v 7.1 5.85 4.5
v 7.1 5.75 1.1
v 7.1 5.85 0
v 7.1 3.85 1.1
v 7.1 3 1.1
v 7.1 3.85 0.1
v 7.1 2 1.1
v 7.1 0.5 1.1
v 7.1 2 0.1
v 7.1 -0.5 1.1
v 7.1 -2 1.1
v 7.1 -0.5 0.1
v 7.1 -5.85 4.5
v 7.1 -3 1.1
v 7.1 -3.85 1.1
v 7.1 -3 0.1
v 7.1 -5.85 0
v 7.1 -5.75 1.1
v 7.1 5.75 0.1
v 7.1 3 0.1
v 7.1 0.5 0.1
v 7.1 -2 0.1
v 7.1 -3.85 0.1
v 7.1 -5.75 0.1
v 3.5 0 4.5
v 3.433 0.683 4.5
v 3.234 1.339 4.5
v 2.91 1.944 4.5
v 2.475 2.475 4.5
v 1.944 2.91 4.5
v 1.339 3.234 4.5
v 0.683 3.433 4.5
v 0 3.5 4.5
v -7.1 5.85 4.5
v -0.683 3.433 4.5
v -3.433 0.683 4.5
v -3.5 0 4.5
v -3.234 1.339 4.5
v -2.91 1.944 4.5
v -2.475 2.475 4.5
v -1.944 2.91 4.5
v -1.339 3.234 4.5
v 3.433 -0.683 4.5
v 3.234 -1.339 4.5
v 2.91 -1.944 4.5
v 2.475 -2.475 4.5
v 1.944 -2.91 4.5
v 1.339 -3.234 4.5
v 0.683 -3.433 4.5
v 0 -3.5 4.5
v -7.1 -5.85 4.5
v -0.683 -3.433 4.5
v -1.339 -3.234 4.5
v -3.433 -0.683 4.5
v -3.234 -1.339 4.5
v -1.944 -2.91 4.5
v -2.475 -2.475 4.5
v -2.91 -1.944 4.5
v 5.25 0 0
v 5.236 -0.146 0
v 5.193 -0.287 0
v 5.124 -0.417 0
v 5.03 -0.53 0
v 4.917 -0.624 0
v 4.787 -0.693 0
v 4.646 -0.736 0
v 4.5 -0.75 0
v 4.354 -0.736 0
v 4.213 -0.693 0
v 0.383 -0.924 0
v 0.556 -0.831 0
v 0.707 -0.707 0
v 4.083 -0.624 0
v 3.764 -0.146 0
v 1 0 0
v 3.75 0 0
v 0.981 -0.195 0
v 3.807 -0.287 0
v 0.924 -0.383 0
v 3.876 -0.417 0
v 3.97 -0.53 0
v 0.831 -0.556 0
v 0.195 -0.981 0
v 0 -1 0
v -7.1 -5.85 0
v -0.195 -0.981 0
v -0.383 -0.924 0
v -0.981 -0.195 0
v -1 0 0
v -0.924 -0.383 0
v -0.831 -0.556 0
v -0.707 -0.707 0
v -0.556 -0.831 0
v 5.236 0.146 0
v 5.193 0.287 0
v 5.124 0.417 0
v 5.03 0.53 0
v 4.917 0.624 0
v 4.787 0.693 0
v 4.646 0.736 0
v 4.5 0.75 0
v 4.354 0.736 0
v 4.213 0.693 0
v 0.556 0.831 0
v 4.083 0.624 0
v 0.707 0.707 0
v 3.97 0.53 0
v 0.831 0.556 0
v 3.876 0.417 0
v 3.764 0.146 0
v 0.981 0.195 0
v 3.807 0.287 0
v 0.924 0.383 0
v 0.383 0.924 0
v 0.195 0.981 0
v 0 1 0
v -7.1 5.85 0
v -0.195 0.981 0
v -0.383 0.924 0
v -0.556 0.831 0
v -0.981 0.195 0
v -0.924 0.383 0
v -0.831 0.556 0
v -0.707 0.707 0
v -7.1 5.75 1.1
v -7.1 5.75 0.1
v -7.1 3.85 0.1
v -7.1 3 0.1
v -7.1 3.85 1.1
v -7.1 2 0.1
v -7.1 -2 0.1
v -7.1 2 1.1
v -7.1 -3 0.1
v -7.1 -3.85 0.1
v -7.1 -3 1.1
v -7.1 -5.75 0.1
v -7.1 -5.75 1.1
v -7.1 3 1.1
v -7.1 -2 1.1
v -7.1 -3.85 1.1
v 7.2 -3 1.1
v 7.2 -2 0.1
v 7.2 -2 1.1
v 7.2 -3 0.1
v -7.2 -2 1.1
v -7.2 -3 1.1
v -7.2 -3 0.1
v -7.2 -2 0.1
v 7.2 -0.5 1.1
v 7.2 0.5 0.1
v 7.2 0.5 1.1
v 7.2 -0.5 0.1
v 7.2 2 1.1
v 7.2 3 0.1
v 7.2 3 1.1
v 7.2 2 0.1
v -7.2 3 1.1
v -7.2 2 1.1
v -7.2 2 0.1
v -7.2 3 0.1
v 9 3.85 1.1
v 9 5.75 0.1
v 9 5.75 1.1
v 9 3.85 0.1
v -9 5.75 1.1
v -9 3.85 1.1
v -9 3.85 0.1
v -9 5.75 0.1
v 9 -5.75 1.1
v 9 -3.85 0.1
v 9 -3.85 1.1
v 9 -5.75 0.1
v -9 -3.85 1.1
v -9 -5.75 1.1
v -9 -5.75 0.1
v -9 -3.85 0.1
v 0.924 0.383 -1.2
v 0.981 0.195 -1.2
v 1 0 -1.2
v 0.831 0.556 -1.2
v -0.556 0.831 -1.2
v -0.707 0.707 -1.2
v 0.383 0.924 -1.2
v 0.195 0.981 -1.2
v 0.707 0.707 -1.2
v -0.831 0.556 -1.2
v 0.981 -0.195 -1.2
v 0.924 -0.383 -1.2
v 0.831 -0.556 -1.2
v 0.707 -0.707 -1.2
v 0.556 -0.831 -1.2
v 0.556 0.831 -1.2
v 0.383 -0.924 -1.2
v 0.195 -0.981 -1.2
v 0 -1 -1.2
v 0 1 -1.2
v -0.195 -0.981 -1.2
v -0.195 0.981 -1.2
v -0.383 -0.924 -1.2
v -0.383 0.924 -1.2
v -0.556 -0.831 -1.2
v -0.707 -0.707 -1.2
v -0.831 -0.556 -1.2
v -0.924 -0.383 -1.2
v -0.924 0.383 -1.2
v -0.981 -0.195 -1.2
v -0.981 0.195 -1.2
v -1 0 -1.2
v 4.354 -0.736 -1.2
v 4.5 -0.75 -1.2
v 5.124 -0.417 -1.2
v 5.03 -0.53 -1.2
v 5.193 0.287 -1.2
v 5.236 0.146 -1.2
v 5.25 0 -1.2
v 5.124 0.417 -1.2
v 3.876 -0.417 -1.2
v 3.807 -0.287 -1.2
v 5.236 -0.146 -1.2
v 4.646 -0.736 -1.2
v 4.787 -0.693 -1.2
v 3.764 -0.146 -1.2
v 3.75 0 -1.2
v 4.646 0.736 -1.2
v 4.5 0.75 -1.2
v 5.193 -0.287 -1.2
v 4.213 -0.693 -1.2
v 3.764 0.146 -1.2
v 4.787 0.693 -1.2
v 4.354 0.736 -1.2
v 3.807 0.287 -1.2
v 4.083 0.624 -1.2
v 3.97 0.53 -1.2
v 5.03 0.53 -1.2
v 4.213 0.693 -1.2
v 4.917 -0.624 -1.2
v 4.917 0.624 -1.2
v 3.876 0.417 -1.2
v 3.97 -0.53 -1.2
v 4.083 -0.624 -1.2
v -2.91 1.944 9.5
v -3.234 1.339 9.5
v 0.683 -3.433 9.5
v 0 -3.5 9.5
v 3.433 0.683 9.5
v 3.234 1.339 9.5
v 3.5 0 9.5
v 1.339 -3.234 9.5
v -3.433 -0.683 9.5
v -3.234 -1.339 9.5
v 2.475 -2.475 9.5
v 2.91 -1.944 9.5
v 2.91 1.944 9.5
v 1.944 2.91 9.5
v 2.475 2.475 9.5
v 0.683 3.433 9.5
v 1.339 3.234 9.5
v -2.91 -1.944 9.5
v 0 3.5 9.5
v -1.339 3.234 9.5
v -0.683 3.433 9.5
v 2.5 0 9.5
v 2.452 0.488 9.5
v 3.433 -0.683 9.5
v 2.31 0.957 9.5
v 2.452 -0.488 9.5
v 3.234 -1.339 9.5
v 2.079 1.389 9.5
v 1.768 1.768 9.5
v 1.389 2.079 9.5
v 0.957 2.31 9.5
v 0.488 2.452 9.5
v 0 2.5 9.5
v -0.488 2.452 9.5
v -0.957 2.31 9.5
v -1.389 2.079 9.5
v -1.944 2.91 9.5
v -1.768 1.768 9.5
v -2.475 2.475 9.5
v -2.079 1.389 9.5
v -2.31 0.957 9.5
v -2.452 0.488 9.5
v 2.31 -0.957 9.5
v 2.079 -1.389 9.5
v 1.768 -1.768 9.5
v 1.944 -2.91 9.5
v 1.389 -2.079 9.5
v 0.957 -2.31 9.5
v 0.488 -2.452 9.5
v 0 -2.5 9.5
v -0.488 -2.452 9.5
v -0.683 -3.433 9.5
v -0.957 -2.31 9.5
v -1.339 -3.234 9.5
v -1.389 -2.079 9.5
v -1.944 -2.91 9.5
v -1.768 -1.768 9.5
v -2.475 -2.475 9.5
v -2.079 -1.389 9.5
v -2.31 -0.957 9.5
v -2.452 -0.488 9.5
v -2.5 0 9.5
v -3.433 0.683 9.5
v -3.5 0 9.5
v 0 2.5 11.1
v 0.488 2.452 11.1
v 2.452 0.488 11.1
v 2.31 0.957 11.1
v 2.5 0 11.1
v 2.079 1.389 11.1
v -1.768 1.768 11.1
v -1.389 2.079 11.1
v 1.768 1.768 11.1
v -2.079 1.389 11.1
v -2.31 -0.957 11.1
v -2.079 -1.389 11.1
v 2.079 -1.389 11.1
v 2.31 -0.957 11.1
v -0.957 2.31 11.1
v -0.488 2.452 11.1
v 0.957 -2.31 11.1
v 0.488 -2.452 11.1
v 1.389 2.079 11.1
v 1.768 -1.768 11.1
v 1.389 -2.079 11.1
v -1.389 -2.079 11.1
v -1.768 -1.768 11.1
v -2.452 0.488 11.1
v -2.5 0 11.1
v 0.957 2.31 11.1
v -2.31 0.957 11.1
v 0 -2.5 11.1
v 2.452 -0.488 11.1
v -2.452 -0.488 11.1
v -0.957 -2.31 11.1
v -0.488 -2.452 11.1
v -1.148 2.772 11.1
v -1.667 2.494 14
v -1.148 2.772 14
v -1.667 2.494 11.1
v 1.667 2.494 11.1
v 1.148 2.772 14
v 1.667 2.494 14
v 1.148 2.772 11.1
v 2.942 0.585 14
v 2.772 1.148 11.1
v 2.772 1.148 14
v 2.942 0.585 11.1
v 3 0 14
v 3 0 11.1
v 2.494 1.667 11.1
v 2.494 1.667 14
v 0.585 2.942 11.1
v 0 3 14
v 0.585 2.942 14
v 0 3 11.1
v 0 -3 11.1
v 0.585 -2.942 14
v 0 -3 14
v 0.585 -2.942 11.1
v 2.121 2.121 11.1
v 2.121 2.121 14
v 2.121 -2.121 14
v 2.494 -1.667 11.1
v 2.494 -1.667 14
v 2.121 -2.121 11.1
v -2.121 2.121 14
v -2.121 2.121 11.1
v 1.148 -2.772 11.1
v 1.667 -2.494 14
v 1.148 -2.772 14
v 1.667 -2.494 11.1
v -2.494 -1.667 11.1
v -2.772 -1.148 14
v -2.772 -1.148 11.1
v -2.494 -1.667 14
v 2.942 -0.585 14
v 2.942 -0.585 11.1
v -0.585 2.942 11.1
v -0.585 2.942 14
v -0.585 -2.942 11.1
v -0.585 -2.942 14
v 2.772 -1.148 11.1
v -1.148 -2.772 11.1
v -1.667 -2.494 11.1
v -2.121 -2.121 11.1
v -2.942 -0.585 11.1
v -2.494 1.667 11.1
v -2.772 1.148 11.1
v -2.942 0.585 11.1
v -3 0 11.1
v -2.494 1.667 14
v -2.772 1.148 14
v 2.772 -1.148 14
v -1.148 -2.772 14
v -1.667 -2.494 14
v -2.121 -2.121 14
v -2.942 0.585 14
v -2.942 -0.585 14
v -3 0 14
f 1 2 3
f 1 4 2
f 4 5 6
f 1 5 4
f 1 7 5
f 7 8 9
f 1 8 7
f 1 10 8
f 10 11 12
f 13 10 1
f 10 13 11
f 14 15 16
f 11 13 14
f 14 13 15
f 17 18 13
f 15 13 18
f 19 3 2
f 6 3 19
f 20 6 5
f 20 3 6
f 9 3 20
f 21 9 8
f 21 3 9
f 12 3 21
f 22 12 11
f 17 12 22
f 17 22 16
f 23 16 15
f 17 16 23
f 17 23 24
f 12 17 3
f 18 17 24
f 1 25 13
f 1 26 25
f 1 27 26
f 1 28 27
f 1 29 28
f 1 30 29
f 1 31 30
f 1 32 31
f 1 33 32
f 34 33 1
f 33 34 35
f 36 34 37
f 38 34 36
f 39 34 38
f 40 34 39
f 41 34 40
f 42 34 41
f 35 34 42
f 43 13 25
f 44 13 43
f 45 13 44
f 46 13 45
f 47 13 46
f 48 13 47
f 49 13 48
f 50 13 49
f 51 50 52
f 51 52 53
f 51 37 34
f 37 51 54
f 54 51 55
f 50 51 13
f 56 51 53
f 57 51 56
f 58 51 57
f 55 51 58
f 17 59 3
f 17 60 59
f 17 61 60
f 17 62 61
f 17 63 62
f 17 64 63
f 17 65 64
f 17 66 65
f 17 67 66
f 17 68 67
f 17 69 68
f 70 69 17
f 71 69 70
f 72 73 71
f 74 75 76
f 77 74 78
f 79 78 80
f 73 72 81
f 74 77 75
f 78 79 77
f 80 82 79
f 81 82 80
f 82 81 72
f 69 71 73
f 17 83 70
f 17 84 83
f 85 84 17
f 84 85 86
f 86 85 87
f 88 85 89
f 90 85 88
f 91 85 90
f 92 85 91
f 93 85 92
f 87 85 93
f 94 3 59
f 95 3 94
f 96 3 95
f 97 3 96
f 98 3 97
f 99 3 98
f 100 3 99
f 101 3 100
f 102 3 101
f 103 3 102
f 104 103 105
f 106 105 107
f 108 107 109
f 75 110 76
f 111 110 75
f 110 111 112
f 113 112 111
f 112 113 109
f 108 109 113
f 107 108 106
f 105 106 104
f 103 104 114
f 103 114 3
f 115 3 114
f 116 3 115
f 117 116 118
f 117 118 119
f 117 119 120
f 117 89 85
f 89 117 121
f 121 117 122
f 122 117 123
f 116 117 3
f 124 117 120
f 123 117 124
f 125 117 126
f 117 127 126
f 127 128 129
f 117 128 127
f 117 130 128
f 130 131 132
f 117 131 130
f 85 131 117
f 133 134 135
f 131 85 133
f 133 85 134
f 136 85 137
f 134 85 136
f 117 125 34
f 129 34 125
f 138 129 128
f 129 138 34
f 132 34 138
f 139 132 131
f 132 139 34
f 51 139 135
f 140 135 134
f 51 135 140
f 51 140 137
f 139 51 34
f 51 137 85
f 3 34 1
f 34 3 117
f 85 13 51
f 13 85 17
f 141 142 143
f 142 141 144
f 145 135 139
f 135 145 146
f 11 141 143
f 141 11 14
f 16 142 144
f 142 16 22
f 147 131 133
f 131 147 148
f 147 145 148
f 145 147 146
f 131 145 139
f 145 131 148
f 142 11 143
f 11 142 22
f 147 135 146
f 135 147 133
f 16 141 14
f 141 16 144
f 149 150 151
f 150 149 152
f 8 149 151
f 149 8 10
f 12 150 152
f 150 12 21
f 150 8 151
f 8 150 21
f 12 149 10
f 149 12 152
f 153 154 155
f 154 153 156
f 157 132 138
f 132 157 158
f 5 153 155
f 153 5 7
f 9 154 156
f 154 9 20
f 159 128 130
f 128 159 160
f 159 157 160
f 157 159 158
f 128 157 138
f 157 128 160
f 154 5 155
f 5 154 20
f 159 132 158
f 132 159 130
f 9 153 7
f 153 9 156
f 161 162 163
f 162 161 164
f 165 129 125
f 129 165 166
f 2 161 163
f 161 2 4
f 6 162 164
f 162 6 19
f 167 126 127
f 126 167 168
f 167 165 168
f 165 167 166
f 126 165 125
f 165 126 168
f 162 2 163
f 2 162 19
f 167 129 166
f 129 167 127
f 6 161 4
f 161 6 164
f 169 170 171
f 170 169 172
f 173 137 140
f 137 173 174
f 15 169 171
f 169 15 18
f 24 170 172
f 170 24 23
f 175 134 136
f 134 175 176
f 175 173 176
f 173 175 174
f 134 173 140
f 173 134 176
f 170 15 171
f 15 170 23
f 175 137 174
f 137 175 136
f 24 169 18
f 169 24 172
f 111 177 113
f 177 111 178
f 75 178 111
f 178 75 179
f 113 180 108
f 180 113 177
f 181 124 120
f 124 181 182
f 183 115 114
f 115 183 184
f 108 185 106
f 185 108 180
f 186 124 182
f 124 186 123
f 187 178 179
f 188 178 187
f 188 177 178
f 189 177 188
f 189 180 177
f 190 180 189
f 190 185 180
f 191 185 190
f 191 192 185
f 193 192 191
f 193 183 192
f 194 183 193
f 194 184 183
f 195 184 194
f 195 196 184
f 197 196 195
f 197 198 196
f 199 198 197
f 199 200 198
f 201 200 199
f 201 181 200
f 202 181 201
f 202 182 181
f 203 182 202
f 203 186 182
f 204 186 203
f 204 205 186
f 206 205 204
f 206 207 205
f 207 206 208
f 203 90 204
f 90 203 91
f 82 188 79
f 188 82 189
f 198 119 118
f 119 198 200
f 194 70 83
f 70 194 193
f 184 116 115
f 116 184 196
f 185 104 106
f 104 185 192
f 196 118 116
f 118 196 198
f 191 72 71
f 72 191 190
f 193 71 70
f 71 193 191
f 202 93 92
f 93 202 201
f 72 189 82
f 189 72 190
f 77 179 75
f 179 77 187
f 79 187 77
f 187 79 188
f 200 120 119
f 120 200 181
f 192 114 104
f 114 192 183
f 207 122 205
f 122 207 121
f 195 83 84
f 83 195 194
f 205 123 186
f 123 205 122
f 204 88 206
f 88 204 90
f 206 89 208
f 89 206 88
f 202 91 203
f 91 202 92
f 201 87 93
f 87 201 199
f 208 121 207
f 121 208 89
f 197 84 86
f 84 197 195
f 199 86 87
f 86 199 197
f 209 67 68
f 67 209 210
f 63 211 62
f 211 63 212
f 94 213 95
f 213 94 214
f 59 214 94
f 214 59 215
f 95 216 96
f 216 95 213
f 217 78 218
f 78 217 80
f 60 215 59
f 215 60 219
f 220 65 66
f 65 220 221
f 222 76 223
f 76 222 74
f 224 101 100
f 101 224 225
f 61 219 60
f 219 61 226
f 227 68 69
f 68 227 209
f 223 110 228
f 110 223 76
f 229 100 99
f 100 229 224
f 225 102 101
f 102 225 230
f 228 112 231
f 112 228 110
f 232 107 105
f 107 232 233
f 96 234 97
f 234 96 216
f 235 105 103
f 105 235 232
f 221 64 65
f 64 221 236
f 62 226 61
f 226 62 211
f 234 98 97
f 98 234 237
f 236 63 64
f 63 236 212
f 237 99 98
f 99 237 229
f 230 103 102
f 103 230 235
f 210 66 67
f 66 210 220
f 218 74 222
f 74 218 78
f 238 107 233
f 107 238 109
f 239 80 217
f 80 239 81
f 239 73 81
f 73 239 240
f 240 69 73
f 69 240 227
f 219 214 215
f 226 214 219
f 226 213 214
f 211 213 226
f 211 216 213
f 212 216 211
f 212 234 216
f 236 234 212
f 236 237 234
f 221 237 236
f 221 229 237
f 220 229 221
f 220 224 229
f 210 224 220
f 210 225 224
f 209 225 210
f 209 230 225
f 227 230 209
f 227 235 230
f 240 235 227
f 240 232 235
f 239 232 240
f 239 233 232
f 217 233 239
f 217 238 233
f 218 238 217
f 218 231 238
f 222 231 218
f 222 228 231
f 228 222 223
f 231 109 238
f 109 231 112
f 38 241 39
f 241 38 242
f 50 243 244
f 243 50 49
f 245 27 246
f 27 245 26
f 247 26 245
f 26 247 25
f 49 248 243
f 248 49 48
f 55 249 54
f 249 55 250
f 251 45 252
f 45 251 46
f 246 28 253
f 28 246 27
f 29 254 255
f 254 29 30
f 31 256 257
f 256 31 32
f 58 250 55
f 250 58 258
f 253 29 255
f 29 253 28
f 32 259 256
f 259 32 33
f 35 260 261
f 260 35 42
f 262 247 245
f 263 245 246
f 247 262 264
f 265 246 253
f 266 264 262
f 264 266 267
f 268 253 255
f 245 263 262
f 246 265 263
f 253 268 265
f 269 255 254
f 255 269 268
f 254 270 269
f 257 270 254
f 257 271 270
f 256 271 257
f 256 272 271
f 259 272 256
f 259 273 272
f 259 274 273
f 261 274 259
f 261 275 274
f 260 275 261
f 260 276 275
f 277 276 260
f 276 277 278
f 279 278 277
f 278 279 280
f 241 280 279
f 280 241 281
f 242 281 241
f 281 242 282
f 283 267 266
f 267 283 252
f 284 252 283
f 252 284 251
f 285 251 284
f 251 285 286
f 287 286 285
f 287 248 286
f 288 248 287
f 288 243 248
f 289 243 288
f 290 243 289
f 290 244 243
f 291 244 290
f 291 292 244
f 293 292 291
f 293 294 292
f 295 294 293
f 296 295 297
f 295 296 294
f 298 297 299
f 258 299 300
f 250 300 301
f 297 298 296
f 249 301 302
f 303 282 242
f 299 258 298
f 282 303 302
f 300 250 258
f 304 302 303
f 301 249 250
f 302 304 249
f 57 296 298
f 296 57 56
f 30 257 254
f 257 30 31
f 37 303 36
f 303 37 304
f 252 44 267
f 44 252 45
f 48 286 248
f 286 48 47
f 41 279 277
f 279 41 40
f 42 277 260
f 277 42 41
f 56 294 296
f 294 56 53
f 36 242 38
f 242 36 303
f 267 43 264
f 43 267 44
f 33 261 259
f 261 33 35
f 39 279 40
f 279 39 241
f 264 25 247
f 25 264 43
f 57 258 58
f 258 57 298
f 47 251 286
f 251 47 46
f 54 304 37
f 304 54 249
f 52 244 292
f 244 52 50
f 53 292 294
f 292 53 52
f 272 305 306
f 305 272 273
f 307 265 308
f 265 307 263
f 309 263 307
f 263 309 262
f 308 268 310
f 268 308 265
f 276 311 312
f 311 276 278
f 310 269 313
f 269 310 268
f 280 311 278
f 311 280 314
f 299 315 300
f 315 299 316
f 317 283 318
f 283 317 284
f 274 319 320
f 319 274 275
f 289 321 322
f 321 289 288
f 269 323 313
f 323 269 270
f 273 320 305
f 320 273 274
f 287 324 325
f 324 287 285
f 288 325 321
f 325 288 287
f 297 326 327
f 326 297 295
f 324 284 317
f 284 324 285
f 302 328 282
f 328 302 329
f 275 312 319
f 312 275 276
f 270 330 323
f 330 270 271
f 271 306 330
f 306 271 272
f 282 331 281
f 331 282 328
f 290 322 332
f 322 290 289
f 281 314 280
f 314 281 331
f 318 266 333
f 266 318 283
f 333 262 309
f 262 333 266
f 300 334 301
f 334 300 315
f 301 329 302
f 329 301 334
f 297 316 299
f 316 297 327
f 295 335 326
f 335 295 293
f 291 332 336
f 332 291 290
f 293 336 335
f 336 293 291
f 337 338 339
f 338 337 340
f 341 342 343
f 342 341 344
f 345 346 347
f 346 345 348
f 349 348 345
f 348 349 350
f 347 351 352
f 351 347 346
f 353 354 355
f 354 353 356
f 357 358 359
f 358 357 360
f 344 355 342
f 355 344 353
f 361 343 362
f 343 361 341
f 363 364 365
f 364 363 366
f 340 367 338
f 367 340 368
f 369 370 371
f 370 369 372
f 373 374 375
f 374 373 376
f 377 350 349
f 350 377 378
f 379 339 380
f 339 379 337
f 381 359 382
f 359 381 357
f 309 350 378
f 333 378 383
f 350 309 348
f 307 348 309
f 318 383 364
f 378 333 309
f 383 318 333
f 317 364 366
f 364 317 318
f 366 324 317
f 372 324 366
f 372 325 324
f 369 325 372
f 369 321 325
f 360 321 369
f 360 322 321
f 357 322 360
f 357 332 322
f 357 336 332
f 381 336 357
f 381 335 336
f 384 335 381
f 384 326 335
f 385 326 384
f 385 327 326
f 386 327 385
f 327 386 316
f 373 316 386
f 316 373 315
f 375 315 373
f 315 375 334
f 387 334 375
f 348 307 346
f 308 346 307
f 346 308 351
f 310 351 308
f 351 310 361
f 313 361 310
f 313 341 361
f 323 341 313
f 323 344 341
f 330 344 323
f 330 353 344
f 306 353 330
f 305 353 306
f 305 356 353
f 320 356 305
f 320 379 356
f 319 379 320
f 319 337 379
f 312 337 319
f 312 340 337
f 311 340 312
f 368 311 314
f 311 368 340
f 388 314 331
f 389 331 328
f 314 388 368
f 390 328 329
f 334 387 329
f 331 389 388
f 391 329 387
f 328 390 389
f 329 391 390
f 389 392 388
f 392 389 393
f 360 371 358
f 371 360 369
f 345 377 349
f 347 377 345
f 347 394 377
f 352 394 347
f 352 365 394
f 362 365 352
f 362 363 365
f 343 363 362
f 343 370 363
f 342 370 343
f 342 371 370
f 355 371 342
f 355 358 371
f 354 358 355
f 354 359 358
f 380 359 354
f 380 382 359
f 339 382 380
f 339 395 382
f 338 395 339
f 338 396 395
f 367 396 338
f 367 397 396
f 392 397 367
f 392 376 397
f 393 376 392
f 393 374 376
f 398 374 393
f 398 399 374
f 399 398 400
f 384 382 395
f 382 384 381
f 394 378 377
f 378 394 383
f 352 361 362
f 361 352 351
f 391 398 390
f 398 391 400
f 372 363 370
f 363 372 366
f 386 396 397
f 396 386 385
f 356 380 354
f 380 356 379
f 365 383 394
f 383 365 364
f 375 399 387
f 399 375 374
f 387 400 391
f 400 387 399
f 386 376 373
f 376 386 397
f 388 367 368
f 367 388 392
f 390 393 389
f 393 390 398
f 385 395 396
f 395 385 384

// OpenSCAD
/**
 * Martin Egli
 * 2023-09-13
 */

module origin(col = "red", loc_res = 5, height = 20) {
    color(col)
    cylinder(d1 = 0, d2 = 1, h = 20, $fn = loc_res);
}

//TC20-11RWA
module ledsTC2011RWA(loc_res = 32, show_origin = 1) {
    // origin: center
    if(show_origin) {
        translate([0, 0, 0])
        origin();
    }
    
    translate([-6/2*2.54, -38.1/2, 0]) {
        // pins
        color("LightGray") {
            // pins 1 - 7
            translate([0, 0, -4])
            for(n = [0:1:6]) {
                translate([n*2.54, 0, 0])
                rotate([0, 0, 45])
                cylinder(d = 0.5, h = 4, $fn = 4);
            }
            // pins 8 - 14
            translate([0, 38.1, -4])
            for(n = [0:1:6]) {
                translate([n*2.54, 0, 0])
                rotate([0, 0, 45])
                cylinder(d = 0.5, h = 4, $fn = 4);
            }
        }
        deltax = (37.7-(6*2.54))/2;
        deltay = (53-38.1)/2;
        // case
        color("White")
        translate([-deltax, -deltay, 0])
        cube([37.7-0.1, 53, 8.45]);
        
        deltax2 = (37.7 - 4*7.62)/2;
        deltay2 = (53 - 6*7.62)/2;
        leddia = 5.0;
        color("Red")
        translate([-(deltax-deltax2), -deltay2, 8.45]) {
            for(m = [0:1:6]) {
                for(n = [0:1:4]) {
                    translate([n*7.62, m*7.62, 0])
                    cylinder(d = leddia, h = 0.1, $fn = loc_res);
                }
            }
        }
    }
}

//TC20-11RWA
module ledsTC2011RWA_cut(loc_res = 32, cut_height = 10, show_origin = 1) {
    // origin: center
    if(show_origin) {
        translate([0, 0, 0])
        origin();
    }
    
    translate([-6/2*2.54, -38.1/2, 0]) {
        deltax = (37.7-(6*2.54))/2+0.2;
        deltay = (53-38.1)/2+0.2;
        // case
        translate([-deltax, -deltay, 0])
        cube([37.7-0.1+0.2*2, 53+0.2*2, cut_height]);
    }
}

//TC20-11RWA
module ledsTC2011RWA_chtholes(loc_res = 32) {
    translate([-6/2*2.54, -38.1/2, 0]) {
        // pins
        color("LightGray") {
            // pins 1 - 7
            translate([0, 0, -4])
            for(n = [0:1:6]) {
                translate([n*2.54, 0, 0])
                rotate([0, 0, 45])
                cylinder(d = 1, h = 5, $fn = loc_res);
            }
            // pins 8 - 14
            translate([0, 38.1, -4])
            for(n = [0:1:6]) {
                translate([n*2.54, 0, 0])
                rotate([0, 0, 45])
                cylinder(d = 1, h = 5, $fn = loc_res);
            }
        }
    }
}
//ledsTC2011RWA();
//ledsTC2011RWA_cut();
//ledsTC2011RWA_chtholes();

//TS02-66-95-BK-260-LCR-D
module buttonTS0266(height = 6, loc_res = 32, show_origin = 1) {
    // origin: center
    if(show_origin) {
        translate([0, 0, 0])
        origin();
    }
    // button
    color("Black")
    translate([0, 0, 0])
    cylinder(d = 4, h = height, $fn = loc_res);
    
    // body
    color("Black")
    translate([-3, -3, 0])
    cube([6, 6, 3.5-0.1]);
    color("LightGray")
    translate([-3, -3, 3.5-0.1])
    cube([6, 6, 0.1]);
    
    // THT
    color("LightGray") {
        translate([-6.5/2, -4.5/2, -3])
        cylinder(d = 1.0, h = 4, $fn = loc_res);
        translate([-6.5/2, +4.5/2, -3])
        cylinder(d = 1.0, h = 4, $fn = loc_res);
        translate([+6.5/2, -4.5/2, -3])
        cylinder(d = 1.0, h = 4, $fn = loc_res);
        translate([+6.5/2, +4.5/2, -3])
        cylinder(d = 1.0, h = 4, $fn = loc_res);
    }
}

module buttonTS026695(loc_res = 32, show_origin = 1) {
    buttonTS0266(9.5, loc_res, show_origin);
}

module buttonTS0266_cut(height = 12, loc_res = 32, show_origin = 1) {
    // origin: center
    if(show_origin) {
        translate([0, 0, 0])
        origin();
    }
    // button
    translate([0, 0, 0])
    cylinder(d = 5, h = height, $fn = loc_res);
    // body
    translate([-3.5, -3.5, 0])
    cube([7, 7, 3.7]);
}

module buttonTS0266_cutholes(loc_res = 32) {
    // origin: center
    translate([-6.5/2, -4.5/2, -3])
    cylinder(d = 1.5, h = 5, $fn = loc_res);
    translate([-6.5/2, +4.5/2, -3])
    cylinder(d = 1.5, h = 5, $fn = loc_res);
    translate([+6.5/2, -4.5/2, -3])
    cylinder(d = 1.5, h = 5, $fn = loc_res);
    translate([+6.5/2, +4.5/2, -3])
    cylinder(d = 1.5, h = 5, $fn = loc_res);
}

//buttonTS026695();
//buttonTS0266_cut();
//buttonTS0266_cutholes();

module switchMFP140_5x(loc_res = 32, show_origin = 1) {
    // origin: center
    if(show_origin) {
        translate([0, 0, 0])
        origin();
    }
    color("Silver")
    translate([-18.2/2, -6/2, -5.6/2])
    cube([18.2, 6, 5.6]);
    color("Black")
    translate([-2*3.2, 6/2, -3.4/2])
    cube([3.4, 5, 3.4]);
    // pins, 5x
    color("Silver")
    for(n = [0:1:4]) {
        translate([-2*3.2+n*3.2, -3.4-6/2, 0])
        rotate([-90, 0, 0])
        rotate([0, 0, 45])
        cylinder(d = 1, h = 4, $fn = 4);
    }
}

module switchMFP140_5x_cut() {
    translate([-18.6/2, -6.4/2, -6/2])
    cube([18.6, 6.4, 6]);
}
//switchMFP140_5x();
//switchMFP140_5x_cut();


// PEC11S-929K-H/S0015
module rotary_encoder_pec11s_929k(loc_res = 32) {
    // body
    color("DarkGray")
    translate([-14.2/2, -11.7/2, 0])
    cube([14.2, 11.7, 4.5]);
    // working contacts
    color("LightGray")
    translate([-14.4/2, -(5/2+1/2), 0.1])
    cube([14.4, 1, 1]);
    color("LightGray")
    translate([0, -(1/2), 0.1])
    cube([14.4/2, 1, 1]);
    color("LightGray")
    translate([-14.4/2, +(5/2-1/2), 0.1])
    cube([14.4, 1, 1]);
    // mounting contacts
    color("LightGray")
    translate([-18/2, +(11.7/2-2), 0.1])
    cube([18, 1.9, 1]);
    color("LightGray")
    translate([-18/2, -(11.7/2)+0.1, 0.1])
    cube([18, 1.9, 1]);
    // positioning pegs
    color("DarkGray")
    translate([0, 0, -1.2])
    cylinder(d = 2, h = 1.3, $fn = loc_res);
    color("DarkGray")
    translate([+4.5, 0, -1.2])
    cylinder(d = 1.5, h = 1.3, $fn = loc_res);
    // shaft
    color("DarkGray")
    translate([0, 0, 4.5])
    cylinder(d = 7, h = 5, $fn = loc_res);
    // kurled head
    color("LightGray")
    translate([0, 0, 4.5+5])
    cylinder(d = 5, h = 2.9, $fn = loc_res);
    color("LightGray")
    translate([0, 0, 4.5+(9.5-2.9)])
    cylinder(d = 6, h = 2.9, $fn = loc_res);
}
rotary_encoder_pec11s_929k();
